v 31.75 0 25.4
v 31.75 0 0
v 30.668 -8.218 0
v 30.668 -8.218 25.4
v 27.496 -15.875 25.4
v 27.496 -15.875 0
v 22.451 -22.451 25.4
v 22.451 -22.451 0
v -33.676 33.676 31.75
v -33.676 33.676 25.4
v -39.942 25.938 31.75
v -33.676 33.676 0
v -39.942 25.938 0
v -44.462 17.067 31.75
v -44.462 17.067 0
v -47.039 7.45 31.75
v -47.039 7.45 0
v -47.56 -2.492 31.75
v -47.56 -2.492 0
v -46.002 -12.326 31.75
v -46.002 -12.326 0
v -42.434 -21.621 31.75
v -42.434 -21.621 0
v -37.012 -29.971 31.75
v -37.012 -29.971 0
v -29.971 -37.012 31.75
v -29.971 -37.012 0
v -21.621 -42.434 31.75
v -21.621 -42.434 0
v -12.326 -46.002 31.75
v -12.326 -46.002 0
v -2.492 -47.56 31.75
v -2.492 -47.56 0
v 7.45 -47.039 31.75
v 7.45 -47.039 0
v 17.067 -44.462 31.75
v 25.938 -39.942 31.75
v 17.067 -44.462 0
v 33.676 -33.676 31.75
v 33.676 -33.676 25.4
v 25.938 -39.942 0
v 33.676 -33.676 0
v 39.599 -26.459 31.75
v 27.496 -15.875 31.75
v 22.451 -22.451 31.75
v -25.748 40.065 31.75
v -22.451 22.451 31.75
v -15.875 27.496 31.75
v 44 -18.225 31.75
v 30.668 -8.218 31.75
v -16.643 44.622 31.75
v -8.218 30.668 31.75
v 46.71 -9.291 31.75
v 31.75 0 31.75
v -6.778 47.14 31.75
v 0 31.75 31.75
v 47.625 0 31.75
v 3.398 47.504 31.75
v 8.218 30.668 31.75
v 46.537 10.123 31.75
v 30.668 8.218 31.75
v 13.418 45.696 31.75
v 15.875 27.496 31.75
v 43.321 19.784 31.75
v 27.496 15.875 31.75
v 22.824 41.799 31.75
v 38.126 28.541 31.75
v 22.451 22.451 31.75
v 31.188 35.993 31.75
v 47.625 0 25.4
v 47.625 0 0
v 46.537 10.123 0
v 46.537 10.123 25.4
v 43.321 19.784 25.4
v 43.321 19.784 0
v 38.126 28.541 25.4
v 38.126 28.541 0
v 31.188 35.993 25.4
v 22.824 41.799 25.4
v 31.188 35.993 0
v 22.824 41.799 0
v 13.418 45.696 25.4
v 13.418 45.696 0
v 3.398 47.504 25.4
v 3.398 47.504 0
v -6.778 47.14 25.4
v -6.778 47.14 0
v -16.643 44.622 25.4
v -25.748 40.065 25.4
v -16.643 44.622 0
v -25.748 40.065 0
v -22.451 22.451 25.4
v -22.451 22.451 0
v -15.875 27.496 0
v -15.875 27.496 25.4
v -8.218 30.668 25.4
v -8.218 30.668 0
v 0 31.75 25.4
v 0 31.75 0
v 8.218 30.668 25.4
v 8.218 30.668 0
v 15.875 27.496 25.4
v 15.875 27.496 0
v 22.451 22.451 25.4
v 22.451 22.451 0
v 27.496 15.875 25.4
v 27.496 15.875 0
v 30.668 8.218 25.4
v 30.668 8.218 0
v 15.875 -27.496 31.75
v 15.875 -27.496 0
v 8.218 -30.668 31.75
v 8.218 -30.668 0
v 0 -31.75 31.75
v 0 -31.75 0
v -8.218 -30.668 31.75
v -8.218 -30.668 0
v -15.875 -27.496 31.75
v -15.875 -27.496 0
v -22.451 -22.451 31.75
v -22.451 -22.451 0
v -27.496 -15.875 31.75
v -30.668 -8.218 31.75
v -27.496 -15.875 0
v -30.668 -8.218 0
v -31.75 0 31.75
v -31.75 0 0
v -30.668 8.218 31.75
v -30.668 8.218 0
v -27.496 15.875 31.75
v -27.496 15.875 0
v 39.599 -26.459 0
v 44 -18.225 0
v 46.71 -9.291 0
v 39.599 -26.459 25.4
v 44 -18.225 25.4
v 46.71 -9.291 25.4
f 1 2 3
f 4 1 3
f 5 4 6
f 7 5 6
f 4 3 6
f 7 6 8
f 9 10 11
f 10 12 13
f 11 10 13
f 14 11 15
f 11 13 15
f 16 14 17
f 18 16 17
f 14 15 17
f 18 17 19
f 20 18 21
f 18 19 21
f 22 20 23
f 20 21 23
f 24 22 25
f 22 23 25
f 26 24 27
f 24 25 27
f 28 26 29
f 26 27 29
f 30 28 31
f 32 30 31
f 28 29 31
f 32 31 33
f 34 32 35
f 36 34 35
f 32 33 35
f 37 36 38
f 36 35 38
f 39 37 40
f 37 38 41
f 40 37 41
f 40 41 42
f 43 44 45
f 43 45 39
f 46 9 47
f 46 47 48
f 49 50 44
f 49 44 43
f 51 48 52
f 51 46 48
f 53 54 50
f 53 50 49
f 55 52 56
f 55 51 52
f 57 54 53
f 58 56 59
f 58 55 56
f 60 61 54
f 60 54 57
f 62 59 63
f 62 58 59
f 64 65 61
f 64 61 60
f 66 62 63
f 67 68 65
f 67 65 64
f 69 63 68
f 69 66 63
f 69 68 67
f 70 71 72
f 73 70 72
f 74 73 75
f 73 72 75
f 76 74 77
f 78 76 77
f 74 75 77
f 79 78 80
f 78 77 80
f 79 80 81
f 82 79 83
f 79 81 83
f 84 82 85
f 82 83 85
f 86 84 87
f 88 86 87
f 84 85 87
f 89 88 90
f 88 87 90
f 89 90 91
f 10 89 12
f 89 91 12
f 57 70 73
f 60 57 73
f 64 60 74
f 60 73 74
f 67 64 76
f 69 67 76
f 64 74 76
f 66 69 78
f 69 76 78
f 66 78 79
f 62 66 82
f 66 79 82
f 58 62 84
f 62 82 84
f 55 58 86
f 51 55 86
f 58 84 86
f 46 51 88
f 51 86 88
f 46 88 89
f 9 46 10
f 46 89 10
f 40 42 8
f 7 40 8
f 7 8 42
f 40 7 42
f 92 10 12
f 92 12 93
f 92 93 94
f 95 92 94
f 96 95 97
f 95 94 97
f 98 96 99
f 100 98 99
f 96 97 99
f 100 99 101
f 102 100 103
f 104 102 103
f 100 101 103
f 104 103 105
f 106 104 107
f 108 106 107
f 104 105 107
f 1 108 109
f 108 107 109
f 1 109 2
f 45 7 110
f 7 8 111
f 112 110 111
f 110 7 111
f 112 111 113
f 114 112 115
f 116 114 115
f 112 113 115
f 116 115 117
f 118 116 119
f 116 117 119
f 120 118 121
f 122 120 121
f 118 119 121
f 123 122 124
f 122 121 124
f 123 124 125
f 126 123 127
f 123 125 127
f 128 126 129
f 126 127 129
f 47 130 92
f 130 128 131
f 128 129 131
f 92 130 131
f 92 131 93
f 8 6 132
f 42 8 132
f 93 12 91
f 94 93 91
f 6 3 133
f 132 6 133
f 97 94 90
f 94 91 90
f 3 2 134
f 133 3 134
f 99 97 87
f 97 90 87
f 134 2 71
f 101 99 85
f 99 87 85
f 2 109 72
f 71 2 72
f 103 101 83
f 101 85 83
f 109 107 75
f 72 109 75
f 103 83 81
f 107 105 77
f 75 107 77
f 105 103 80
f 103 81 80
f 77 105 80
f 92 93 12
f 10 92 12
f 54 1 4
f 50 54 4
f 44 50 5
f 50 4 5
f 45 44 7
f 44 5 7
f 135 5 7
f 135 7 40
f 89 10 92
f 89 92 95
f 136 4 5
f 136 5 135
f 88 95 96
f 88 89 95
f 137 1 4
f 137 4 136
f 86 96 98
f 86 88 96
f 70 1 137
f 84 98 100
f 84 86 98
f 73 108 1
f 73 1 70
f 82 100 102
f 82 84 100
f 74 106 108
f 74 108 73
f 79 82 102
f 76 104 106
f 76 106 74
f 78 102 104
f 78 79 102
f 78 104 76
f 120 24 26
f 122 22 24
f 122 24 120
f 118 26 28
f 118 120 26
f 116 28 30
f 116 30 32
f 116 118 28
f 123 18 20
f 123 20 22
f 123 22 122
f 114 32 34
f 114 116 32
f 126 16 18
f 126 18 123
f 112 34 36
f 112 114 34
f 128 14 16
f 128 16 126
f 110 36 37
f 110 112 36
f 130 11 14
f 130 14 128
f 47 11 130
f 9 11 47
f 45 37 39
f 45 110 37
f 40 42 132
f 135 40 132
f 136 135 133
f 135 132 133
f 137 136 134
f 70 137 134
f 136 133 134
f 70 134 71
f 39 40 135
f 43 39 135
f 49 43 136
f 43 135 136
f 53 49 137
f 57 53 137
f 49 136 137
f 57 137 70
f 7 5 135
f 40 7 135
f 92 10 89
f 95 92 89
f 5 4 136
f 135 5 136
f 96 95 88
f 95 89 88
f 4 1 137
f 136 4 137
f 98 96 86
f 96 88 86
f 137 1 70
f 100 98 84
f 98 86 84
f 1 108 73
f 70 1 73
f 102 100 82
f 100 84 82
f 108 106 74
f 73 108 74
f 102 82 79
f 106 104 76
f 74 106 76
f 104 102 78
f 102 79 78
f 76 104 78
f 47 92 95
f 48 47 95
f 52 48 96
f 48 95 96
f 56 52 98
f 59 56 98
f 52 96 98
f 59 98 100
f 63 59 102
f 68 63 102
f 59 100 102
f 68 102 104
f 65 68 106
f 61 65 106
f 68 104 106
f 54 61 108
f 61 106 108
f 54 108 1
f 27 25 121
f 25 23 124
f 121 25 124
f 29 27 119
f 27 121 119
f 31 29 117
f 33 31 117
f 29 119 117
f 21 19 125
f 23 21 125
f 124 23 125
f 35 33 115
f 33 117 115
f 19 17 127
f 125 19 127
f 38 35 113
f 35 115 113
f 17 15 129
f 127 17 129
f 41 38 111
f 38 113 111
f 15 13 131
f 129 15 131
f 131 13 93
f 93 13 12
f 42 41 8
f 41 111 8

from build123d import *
from build123d import SkipClean  # not in build123d's __all__

# Parameters (mm, degrees)
F1_DEPTH = 25.4
F2_DEPTH = 31.75
F3_DEPTH = 6.35


with BuildPart() as f1:
    # F0 (on Top) → F1 (new body)
    with BuildSketch(Plane.XY):
        with BuildLine():
            ThreePointArc((33.675960454, -33.675960454), (43.9997627359, -18.2252984664), (47.625, 0))
            ThreePointArc((47.625, 0), (18.2252984664, 43.9997627359), (-33.675960454, 33.675960454))
            Line((-33.675960454, 33.675960454), (-22.4506403027, 22.4506403027))
            ThreePointArc((-22.4506403027, 22.4506403027), (12.1501989776, 29.3331751572), (31.75, 0))
            ThreePointArc((31.75, 0), (29.3331751572, -12.1501989776), (22.4506403027, -22.4506403027))
            Line((22.4506403027, -22.4506403027), (33.675960454, -33.675960454))
        make_face()
    extrude(amount=F1_DEPTH)


with BuildPart() as f2:
    # F0 (on Top) → F2 (new body)
    with BuildSketch(Plane.XY):
        with BuildLine():
            Line((-22.4506403027, 22.4506403027), (-33.675960454, 33.675960454))
            ThreePointArc((-33.675960454, 33.675960454), (-33.675960454, -33.675960454), (33.675960454, -33.675960454))
            Line((33.675960454, -33.675960454), (22.4506403027, -22.4506403027))
            ThreePointArc((22.4506403027, -22.4506403027), (-22.4506403027, -22.4506403027), (-22.4506403027, 22.4506403027))
        make_face()
    extrude(amount=F2_DEPTH)

    # F3 (add): a face of the model
    f3_faces = [f1.part.faces().sort_by_distance(p)[0] for p in [
        (32.8629508495, 32.8629508495, 25.4),
    ]]
    with SkipClean():  # cleaning this boolean's faces spoils the solid; the shape is the same uncleaned
        extrude(f3_faces, amount=F3_DEPTH)


solid = Compound([f1.part, f2.part])
